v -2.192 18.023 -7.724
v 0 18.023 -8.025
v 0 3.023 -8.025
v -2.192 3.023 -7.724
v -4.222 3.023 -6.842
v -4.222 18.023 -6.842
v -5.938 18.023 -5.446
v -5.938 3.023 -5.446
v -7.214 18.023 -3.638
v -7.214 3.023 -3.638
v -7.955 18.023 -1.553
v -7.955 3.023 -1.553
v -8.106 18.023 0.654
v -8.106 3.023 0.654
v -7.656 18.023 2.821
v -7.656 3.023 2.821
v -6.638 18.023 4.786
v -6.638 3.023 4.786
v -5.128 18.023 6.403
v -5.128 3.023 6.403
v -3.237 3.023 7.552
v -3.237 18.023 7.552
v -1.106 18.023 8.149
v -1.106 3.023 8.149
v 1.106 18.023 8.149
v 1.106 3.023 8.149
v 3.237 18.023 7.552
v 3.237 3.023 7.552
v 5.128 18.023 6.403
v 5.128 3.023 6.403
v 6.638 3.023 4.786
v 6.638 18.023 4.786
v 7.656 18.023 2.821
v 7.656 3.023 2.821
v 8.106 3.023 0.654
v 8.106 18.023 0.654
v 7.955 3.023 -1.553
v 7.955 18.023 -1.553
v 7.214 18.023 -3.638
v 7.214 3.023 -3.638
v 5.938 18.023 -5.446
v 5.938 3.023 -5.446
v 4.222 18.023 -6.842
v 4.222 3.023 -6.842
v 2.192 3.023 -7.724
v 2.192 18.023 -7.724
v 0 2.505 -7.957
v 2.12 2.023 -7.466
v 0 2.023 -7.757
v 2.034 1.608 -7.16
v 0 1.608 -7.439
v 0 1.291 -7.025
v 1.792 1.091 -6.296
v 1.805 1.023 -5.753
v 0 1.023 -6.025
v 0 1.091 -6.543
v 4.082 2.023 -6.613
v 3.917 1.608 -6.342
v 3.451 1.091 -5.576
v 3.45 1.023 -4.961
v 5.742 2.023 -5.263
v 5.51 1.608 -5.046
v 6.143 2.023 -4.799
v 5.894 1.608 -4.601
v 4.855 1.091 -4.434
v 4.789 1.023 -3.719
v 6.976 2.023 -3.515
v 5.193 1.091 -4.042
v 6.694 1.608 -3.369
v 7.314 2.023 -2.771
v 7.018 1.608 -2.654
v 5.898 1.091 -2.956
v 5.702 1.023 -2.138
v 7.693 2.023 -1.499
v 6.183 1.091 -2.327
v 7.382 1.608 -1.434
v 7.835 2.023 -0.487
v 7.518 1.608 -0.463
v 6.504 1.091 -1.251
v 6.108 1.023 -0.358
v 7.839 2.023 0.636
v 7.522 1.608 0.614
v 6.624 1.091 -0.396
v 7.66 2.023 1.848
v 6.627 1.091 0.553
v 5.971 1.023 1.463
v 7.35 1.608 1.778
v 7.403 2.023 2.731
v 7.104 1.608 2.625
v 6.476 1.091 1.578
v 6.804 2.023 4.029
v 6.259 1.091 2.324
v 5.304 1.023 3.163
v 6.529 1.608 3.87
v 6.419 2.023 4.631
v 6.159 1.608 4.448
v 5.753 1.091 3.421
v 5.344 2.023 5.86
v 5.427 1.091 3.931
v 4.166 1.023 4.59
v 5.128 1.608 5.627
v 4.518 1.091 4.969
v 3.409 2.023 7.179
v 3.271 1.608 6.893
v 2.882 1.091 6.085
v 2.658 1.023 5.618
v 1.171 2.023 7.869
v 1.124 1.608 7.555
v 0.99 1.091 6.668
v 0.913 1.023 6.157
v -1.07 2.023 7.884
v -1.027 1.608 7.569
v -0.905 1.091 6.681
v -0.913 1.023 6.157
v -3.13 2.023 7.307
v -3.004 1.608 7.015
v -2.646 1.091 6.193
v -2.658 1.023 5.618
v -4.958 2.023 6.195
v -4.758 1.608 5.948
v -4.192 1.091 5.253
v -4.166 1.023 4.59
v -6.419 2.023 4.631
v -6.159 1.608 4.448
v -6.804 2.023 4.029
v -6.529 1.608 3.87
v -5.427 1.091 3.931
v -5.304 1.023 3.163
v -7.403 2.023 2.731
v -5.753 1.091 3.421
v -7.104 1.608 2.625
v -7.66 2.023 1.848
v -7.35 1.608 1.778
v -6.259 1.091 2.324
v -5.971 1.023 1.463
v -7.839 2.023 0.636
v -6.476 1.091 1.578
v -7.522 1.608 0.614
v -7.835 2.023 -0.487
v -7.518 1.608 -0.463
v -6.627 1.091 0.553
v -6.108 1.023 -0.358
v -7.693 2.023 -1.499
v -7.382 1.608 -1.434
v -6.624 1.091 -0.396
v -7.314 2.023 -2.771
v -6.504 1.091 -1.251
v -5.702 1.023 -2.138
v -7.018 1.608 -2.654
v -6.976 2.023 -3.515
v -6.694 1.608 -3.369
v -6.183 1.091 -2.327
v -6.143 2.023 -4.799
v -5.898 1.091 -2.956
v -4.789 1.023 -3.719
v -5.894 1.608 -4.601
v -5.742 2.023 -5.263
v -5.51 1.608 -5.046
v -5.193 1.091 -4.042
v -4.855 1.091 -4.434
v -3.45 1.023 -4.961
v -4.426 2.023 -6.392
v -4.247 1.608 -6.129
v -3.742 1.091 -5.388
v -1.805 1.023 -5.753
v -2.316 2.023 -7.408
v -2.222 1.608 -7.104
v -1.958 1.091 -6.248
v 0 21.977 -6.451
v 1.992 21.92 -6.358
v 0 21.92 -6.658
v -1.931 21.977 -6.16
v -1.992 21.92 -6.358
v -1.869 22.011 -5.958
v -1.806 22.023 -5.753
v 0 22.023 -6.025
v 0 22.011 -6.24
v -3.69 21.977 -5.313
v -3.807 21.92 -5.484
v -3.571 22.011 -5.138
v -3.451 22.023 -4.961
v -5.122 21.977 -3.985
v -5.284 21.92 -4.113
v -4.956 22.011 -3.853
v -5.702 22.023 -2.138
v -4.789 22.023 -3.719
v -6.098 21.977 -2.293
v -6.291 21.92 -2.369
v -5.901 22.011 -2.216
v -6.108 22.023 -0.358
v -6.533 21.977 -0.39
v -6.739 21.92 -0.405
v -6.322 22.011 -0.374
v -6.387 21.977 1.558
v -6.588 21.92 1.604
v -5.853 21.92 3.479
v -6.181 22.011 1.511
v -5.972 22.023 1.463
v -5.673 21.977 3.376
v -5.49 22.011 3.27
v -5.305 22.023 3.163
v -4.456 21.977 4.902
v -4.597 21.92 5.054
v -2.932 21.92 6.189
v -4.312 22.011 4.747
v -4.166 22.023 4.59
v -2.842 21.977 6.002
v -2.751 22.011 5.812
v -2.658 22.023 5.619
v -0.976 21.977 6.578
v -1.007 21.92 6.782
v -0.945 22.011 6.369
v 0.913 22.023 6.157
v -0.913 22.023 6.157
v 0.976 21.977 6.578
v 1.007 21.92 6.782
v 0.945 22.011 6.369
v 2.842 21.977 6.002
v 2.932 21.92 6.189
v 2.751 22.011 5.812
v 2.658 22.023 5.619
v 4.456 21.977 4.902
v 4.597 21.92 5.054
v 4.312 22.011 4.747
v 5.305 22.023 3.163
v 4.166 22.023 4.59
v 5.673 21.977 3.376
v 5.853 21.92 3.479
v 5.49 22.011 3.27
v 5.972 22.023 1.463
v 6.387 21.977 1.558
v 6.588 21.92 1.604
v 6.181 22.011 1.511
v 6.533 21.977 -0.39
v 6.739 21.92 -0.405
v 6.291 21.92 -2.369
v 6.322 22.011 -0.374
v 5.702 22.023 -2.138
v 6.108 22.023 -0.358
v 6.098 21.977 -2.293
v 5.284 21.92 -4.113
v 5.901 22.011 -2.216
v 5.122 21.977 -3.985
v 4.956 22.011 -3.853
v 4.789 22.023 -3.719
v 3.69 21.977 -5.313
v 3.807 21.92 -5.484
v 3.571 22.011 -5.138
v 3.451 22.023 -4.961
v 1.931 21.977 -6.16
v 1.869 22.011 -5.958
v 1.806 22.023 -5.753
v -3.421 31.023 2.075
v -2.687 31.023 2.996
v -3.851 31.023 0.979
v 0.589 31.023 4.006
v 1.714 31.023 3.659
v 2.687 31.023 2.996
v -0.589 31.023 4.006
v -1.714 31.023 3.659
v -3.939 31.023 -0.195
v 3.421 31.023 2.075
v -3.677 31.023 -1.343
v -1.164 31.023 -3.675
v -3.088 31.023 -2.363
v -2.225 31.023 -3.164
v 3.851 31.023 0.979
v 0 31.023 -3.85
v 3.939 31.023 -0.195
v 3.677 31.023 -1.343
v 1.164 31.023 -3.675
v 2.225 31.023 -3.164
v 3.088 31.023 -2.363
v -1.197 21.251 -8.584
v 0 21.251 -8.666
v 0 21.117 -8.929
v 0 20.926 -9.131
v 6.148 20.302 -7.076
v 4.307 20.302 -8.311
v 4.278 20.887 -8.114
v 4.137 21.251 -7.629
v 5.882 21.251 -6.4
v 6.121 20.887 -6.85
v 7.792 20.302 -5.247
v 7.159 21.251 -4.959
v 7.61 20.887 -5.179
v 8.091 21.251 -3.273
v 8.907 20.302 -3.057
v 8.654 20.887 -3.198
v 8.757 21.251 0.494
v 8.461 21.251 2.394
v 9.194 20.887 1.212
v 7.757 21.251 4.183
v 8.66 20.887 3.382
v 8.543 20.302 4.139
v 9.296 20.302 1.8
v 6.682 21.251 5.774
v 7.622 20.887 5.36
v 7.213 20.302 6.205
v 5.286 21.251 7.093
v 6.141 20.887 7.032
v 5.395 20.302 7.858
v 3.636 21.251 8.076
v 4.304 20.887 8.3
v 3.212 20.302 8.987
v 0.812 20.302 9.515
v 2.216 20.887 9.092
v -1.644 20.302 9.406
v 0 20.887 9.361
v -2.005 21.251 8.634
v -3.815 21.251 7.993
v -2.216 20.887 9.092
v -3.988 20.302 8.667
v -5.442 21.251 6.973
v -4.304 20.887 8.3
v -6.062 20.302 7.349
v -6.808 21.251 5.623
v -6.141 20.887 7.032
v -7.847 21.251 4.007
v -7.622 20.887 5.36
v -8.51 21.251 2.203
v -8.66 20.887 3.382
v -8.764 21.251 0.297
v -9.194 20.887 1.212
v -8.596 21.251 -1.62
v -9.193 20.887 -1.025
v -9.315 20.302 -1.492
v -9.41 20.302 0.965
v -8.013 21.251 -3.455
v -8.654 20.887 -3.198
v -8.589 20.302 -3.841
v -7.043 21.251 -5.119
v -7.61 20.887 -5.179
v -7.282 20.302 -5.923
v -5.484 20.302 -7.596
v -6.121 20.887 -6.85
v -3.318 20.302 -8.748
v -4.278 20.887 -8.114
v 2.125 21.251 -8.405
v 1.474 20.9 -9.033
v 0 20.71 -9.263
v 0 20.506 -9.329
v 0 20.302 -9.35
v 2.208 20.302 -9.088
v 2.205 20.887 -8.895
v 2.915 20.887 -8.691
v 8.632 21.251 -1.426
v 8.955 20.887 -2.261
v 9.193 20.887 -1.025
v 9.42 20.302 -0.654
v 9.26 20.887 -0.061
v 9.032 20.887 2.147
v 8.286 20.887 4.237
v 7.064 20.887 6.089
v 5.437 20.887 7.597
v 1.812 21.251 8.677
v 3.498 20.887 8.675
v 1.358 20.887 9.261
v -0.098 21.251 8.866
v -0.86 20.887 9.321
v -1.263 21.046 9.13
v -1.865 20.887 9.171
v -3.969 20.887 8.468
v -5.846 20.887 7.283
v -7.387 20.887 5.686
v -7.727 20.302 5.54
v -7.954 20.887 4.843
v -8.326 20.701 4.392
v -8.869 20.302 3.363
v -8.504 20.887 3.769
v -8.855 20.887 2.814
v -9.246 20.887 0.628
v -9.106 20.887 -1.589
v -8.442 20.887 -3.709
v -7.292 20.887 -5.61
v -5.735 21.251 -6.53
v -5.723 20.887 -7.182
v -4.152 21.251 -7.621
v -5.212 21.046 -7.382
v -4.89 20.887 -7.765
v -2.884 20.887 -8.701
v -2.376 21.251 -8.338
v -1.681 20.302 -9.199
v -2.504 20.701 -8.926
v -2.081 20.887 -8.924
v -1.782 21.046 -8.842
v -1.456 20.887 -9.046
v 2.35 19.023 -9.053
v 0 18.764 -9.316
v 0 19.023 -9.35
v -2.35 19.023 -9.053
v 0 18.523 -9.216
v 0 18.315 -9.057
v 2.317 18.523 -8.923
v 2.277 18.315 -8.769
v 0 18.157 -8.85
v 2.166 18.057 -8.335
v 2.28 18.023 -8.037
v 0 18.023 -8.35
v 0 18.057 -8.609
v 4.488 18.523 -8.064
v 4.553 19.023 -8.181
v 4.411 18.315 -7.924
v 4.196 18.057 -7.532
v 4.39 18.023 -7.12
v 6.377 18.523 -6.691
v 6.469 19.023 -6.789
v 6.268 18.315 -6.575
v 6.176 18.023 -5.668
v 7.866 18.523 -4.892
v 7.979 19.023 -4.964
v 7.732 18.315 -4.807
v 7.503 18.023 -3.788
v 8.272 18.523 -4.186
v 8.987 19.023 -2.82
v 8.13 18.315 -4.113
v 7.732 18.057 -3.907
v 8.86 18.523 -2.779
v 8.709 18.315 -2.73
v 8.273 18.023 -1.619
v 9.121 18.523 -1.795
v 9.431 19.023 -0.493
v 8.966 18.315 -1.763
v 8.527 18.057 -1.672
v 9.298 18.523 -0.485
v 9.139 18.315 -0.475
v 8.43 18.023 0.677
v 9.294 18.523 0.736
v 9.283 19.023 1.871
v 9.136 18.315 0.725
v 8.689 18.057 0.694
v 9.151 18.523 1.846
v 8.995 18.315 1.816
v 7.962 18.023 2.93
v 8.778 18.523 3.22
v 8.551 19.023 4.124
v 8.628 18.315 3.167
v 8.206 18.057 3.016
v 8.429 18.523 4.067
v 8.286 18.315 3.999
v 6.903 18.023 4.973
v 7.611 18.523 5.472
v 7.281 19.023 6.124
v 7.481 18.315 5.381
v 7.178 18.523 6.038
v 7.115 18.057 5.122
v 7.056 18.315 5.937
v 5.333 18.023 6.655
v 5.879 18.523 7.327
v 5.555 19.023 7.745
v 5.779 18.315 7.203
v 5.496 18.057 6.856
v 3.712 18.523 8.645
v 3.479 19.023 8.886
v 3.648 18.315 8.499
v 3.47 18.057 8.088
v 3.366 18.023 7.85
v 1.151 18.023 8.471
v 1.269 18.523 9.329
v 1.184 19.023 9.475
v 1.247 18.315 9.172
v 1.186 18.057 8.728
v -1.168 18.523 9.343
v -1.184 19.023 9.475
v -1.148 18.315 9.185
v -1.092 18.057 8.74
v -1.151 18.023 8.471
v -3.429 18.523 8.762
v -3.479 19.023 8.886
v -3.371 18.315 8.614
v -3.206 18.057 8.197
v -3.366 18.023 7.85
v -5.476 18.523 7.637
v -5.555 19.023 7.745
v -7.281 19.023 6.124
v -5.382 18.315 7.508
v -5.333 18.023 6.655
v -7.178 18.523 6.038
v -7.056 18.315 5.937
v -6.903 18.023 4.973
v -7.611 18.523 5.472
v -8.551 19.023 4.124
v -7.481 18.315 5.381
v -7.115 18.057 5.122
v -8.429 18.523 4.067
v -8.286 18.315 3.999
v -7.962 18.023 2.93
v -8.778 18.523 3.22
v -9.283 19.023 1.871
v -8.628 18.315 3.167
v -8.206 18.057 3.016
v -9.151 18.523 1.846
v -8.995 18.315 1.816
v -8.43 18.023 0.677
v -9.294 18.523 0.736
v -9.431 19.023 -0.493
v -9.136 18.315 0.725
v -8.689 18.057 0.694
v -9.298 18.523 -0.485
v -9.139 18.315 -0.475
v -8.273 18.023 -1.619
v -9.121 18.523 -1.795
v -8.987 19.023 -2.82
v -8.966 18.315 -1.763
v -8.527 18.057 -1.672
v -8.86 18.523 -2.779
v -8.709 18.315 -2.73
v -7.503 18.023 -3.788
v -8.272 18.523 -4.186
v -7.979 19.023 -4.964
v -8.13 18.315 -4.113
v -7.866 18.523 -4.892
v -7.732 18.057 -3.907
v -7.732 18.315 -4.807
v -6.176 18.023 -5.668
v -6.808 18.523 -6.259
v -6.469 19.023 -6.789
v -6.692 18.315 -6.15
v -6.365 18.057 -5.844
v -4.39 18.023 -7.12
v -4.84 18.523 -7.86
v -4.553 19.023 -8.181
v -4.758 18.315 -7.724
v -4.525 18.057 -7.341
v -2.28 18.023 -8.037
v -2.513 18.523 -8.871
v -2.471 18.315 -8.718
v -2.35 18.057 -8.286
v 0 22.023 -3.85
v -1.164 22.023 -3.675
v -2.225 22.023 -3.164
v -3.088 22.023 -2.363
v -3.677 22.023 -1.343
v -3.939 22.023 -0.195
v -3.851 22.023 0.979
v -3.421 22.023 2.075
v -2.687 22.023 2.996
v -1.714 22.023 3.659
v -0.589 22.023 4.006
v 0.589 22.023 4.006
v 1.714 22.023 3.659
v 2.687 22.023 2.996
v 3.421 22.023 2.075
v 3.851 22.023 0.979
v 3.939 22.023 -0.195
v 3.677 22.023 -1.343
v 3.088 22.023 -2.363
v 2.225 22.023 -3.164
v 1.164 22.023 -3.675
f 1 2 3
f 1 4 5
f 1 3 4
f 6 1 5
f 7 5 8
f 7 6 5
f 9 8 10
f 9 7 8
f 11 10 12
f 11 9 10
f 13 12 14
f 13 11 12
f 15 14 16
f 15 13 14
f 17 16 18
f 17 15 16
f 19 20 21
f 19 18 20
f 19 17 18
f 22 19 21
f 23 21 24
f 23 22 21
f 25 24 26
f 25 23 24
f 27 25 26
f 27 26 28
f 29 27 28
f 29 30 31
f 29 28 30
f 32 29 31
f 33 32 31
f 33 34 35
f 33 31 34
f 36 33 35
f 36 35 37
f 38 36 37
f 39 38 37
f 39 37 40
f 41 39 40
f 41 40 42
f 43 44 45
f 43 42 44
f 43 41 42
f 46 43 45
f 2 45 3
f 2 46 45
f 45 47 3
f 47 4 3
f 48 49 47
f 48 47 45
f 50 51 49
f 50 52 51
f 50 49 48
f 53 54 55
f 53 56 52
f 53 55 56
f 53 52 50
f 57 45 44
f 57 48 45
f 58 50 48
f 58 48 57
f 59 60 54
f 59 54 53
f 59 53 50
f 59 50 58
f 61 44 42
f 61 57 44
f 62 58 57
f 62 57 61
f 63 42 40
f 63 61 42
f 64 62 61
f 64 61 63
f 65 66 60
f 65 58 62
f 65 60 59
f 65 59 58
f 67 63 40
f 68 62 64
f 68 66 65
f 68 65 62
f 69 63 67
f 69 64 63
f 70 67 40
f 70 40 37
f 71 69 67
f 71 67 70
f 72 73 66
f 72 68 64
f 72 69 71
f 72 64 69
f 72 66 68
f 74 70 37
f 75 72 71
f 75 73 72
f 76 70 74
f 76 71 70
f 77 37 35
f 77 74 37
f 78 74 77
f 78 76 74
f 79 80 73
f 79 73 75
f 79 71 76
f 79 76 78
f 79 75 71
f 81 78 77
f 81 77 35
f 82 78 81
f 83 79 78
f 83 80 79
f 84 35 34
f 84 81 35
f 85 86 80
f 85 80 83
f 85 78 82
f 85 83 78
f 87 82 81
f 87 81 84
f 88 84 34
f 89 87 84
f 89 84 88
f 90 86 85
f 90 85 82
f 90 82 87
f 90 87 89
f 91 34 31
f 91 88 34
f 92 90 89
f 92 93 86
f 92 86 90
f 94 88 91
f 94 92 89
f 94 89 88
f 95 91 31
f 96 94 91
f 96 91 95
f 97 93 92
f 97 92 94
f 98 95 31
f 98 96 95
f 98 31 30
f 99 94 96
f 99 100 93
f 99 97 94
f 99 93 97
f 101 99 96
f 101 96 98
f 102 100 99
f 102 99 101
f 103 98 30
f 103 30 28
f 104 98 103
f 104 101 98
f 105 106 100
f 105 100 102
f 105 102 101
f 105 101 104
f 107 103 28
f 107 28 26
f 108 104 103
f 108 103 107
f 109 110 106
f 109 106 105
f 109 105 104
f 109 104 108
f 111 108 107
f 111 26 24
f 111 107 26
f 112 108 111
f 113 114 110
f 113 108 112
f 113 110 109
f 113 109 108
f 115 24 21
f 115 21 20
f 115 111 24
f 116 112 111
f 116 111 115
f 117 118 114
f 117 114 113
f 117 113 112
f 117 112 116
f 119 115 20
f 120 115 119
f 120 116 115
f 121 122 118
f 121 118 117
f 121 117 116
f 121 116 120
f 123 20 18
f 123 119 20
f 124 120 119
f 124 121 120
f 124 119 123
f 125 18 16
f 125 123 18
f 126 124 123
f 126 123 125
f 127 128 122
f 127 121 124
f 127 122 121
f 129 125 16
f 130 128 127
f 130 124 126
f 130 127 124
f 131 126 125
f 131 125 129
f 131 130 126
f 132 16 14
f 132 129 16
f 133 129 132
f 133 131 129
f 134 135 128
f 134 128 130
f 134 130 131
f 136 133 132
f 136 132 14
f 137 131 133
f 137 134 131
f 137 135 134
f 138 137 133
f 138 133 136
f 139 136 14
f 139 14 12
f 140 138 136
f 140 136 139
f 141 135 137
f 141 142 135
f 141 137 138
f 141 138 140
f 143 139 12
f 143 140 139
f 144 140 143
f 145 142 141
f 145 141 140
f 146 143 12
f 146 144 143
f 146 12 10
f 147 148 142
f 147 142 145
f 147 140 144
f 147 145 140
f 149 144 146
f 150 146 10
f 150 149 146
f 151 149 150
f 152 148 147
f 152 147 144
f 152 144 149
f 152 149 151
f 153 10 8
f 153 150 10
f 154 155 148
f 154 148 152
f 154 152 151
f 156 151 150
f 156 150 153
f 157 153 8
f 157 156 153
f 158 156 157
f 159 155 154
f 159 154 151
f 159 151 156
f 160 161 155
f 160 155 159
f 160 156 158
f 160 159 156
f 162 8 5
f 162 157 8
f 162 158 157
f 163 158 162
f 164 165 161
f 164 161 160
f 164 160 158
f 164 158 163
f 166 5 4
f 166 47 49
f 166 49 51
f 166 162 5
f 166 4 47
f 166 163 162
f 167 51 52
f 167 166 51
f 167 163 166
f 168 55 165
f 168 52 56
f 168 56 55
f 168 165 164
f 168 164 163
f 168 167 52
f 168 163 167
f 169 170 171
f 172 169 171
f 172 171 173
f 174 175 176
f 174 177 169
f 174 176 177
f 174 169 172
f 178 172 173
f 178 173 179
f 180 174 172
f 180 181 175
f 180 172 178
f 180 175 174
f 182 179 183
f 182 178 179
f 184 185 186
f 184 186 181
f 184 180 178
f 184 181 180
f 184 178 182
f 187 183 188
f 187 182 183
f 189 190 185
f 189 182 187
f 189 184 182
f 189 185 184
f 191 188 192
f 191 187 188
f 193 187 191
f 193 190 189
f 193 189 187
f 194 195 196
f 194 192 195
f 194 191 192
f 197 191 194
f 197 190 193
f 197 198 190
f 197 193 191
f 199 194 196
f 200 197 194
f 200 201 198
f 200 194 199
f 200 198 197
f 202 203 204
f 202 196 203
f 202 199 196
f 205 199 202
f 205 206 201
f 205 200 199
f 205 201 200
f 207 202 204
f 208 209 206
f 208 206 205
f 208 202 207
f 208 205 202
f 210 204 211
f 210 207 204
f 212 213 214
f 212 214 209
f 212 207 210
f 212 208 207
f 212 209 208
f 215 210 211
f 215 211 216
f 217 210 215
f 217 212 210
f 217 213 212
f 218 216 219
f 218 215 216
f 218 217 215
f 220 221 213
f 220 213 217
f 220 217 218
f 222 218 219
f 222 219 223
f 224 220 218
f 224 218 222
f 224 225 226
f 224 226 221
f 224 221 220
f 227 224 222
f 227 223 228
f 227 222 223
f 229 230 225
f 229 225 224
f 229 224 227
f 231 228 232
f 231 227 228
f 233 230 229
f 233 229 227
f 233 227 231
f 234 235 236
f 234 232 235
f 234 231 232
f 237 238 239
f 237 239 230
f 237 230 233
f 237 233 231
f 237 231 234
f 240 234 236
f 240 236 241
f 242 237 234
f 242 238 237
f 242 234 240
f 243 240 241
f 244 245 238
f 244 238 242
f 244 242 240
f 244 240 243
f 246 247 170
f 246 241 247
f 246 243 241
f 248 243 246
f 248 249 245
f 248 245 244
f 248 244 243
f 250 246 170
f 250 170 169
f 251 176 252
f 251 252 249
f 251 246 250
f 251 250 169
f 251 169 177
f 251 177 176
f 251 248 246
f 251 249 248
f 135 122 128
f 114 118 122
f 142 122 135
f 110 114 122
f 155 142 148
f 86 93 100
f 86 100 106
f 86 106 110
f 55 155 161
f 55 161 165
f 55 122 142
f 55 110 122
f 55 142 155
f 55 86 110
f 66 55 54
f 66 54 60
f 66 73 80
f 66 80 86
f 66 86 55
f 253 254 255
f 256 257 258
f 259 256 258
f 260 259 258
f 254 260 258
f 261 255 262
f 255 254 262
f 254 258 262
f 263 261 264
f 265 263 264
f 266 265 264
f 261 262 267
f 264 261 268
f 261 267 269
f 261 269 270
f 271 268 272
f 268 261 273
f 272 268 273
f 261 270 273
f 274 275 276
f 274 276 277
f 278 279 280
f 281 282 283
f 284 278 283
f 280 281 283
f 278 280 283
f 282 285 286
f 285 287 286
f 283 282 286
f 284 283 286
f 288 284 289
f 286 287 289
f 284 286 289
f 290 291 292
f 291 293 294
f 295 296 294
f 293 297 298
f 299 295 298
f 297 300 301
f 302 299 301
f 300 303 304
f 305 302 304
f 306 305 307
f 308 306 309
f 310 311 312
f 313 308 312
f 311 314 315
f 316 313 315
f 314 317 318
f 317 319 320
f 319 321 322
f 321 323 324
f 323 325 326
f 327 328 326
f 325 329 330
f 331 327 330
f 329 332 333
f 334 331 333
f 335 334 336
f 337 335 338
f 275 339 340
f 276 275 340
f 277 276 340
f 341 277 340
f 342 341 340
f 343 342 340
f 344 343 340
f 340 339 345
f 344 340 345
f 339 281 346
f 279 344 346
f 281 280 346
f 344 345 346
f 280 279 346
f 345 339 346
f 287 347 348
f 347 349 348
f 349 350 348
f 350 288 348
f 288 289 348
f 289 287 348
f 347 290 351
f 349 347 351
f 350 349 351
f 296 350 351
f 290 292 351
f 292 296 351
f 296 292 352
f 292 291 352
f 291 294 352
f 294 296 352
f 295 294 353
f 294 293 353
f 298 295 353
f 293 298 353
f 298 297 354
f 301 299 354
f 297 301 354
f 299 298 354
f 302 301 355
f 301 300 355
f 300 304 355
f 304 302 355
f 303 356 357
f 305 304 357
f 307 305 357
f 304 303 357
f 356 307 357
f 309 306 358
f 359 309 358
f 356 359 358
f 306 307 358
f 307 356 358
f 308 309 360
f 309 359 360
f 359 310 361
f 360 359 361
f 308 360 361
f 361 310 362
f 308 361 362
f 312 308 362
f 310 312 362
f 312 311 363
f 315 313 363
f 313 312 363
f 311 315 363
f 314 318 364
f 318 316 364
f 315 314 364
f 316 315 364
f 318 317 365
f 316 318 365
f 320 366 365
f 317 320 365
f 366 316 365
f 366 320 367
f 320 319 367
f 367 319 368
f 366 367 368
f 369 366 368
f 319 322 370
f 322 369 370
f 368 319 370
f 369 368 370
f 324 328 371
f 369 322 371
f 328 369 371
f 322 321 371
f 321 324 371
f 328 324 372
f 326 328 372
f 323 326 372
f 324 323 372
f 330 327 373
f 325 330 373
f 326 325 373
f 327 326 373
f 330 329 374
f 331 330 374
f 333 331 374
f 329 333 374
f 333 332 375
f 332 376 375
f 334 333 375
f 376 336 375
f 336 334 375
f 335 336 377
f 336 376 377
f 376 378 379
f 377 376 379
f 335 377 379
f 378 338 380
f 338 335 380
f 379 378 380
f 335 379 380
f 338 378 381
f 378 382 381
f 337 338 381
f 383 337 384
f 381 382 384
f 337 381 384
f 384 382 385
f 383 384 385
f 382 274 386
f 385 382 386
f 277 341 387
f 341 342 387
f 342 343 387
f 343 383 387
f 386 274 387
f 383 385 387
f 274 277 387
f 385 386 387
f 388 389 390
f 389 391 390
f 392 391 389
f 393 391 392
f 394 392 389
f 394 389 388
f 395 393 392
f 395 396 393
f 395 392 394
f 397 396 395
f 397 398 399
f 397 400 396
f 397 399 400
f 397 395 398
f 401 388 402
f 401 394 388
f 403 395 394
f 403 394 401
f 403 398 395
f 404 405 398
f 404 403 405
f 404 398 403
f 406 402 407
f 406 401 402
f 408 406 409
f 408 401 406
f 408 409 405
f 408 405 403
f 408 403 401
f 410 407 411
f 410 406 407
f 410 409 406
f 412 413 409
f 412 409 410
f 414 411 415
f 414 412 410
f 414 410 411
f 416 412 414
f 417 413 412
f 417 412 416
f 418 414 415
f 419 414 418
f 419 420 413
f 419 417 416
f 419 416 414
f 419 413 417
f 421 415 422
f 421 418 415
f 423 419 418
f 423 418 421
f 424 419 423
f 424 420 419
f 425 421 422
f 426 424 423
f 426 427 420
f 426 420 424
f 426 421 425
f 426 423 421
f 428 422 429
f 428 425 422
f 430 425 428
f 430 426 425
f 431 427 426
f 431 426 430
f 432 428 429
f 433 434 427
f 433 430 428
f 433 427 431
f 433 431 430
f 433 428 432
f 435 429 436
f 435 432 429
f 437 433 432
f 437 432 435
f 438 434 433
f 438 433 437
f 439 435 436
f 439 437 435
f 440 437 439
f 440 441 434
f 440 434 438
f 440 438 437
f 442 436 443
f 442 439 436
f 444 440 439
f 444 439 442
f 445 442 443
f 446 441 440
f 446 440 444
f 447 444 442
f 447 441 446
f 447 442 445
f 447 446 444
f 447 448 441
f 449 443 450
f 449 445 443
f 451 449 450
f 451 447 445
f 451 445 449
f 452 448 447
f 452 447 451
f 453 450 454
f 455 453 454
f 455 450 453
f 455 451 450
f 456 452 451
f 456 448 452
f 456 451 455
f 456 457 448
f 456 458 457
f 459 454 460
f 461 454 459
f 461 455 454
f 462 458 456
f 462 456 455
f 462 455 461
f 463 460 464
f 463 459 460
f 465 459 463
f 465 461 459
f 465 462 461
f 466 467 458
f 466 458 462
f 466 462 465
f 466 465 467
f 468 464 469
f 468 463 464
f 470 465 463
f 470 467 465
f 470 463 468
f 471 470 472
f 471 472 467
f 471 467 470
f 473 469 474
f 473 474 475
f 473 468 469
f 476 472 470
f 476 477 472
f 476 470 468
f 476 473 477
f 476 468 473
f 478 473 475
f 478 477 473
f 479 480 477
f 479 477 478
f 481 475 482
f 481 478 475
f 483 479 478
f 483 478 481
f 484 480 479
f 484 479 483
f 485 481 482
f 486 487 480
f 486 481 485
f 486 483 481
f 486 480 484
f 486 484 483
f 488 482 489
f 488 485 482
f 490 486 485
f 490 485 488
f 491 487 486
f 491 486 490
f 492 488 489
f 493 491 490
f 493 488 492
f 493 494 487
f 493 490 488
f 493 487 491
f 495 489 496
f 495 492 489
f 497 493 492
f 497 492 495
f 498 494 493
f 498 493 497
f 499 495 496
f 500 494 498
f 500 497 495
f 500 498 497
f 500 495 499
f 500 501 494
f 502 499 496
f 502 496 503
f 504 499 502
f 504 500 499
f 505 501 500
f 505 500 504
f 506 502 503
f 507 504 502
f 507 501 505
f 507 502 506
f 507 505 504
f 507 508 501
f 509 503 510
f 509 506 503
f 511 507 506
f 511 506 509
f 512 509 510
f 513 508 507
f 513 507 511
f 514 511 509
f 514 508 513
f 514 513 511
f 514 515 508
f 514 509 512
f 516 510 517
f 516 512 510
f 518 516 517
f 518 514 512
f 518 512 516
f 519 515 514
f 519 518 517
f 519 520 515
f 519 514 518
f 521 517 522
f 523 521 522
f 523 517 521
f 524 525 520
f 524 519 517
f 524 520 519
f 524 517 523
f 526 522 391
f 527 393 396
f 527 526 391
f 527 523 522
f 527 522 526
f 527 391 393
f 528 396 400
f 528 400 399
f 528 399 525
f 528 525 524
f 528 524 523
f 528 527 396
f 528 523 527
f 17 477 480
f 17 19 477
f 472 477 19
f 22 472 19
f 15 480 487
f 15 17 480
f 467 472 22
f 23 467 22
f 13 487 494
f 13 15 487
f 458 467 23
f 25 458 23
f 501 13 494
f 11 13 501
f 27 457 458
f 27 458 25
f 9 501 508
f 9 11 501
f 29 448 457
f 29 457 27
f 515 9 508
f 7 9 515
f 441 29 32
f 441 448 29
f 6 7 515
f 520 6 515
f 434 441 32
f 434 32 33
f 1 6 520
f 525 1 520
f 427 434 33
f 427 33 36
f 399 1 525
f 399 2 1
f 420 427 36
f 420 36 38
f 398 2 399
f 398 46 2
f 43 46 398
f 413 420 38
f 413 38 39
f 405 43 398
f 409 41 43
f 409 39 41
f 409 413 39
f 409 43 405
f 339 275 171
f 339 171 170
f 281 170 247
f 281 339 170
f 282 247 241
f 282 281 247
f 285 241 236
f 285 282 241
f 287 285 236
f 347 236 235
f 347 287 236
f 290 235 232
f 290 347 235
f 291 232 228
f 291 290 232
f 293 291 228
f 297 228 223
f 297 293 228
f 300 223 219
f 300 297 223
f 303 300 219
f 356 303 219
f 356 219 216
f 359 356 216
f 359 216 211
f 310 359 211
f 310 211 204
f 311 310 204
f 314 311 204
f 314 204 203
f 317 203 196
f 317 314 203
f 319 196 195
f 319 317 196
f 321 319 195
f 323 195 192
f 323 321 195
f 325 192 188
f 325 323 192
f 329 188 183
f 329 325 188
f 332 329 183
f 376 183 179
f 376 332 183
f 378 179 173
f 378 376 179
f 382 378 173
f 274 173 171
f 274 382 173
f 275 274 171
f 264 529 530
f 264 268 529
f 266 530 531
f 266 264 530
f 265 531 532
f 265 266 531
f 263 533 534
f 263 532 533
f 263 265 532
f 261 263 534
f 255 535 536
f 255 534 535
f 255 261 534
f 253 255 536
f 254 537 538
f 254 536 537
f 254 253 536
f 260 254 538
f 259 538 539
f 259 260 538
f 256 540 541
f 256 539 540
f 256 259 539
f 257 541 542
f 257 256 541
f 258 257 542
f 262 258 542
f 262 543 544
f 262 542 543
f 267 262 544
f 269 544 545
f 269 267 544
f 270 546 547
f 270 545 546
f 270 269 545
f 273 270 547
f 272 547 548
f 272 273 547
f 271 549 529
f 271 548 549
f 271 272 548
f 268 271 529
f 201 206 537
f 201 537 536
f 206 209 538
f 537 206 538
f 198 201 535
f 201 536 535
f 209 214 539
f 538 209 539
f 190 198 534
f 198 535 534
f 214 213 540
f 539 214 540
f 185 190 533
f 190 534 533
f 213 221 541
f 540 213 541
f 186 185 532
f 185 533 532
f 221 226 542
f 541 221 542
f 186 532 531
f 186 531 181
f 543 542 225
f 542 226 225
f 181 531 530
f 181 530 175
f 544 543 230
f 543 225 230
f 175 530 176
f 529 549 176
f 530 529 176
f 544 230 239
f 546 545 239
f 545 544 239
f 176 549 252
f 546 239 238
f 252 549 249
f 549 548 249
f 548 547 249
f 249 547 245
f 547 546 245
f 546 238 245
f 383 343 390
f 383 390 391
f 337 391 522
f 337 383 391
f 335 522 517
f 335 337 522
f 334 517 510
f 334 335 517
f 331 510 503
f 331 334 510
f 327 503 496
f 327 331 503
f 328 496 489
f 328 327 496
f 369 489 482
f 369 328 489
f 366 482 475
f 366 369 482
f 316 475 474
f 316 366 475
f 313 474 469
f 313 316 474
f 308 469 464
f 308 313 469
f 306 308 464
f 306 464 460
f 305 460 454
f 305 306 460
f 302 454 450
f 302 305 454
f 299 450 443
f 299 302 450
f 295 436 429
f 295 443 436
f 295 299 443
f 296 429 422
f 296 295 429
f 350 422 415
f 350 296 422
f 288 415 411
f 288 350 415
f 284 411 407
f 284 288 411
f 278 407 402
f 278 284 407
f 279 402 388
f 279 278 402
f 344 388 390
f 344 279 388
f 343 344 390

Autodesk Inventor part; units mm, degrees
ref_plane "YZ Plane" through (0, 0, 0) normal (1, 0, 0) x (0, 1, 0)
ref_plane "XZ Plane" through (0, 0, 0) normal (0, 1, 0) x (-1, 0, 0)
ref_plane "XY Plane" through (0, 0, 0) normal (0, 0, 1) x (1, 0, 0)
sketch "Sketch1" plane through (0, 0, 0) normal (1, 0, 0) x (0, 1, 0)
  line L0 (31.0226, 0.1) -> (1.0226, 0.1)
  line L1 (1.0226, -8.025) -> (18.0226, -8.025)
  line L2 (18.0226, -8.025) -> (18.0226, -9.35)
  line L3 (18.0226, -9.35) -> (21.0226, -9.35)
  line L4 (22.0226, -3.85) -> (31.0226, -3.85)
  line L5 (31.0226, -3.85) -> (31.0226, 0.1)
  line L6 (1.0226, 0.1) -> (1.0226, -8.025)
  line L7 (51.327, 0.1) -> (-7.0634, 0.1) construction
  line L8 (22.0226, -3.85) -> (22.0226, -6.35)
  line L9 (22.0226, -6.35) -> (21.0226, -9.35)
  point P0 (0, 0)
  dimension "d0" = 3.95
  dimension "d2" = 3
  dimension "d4" = 9
  dimension "d5" = 30
  dimension "d7" = 8.125
  dimension "d11" = 2.5
  dimension "d12" = 1
  dimension "d14" = 0
revolve "Revolution1" add sketch "Sketch1" angle 360 about axis through (0, 51.327, 0.1) along (0, -1, 0)
fillet "Fillet1" radius 1 2 edges at (0, 21.0226, 9.55) (0, 18.0226, 9.55)
fillet "Fillet3" radius 2 1 edges at (0, 1.0226, 8.225)
fillet "Fillet4" radius 2 1 edges at (0, 22.0226, 6.55)
properties part number "ConexionDireccionTop"
